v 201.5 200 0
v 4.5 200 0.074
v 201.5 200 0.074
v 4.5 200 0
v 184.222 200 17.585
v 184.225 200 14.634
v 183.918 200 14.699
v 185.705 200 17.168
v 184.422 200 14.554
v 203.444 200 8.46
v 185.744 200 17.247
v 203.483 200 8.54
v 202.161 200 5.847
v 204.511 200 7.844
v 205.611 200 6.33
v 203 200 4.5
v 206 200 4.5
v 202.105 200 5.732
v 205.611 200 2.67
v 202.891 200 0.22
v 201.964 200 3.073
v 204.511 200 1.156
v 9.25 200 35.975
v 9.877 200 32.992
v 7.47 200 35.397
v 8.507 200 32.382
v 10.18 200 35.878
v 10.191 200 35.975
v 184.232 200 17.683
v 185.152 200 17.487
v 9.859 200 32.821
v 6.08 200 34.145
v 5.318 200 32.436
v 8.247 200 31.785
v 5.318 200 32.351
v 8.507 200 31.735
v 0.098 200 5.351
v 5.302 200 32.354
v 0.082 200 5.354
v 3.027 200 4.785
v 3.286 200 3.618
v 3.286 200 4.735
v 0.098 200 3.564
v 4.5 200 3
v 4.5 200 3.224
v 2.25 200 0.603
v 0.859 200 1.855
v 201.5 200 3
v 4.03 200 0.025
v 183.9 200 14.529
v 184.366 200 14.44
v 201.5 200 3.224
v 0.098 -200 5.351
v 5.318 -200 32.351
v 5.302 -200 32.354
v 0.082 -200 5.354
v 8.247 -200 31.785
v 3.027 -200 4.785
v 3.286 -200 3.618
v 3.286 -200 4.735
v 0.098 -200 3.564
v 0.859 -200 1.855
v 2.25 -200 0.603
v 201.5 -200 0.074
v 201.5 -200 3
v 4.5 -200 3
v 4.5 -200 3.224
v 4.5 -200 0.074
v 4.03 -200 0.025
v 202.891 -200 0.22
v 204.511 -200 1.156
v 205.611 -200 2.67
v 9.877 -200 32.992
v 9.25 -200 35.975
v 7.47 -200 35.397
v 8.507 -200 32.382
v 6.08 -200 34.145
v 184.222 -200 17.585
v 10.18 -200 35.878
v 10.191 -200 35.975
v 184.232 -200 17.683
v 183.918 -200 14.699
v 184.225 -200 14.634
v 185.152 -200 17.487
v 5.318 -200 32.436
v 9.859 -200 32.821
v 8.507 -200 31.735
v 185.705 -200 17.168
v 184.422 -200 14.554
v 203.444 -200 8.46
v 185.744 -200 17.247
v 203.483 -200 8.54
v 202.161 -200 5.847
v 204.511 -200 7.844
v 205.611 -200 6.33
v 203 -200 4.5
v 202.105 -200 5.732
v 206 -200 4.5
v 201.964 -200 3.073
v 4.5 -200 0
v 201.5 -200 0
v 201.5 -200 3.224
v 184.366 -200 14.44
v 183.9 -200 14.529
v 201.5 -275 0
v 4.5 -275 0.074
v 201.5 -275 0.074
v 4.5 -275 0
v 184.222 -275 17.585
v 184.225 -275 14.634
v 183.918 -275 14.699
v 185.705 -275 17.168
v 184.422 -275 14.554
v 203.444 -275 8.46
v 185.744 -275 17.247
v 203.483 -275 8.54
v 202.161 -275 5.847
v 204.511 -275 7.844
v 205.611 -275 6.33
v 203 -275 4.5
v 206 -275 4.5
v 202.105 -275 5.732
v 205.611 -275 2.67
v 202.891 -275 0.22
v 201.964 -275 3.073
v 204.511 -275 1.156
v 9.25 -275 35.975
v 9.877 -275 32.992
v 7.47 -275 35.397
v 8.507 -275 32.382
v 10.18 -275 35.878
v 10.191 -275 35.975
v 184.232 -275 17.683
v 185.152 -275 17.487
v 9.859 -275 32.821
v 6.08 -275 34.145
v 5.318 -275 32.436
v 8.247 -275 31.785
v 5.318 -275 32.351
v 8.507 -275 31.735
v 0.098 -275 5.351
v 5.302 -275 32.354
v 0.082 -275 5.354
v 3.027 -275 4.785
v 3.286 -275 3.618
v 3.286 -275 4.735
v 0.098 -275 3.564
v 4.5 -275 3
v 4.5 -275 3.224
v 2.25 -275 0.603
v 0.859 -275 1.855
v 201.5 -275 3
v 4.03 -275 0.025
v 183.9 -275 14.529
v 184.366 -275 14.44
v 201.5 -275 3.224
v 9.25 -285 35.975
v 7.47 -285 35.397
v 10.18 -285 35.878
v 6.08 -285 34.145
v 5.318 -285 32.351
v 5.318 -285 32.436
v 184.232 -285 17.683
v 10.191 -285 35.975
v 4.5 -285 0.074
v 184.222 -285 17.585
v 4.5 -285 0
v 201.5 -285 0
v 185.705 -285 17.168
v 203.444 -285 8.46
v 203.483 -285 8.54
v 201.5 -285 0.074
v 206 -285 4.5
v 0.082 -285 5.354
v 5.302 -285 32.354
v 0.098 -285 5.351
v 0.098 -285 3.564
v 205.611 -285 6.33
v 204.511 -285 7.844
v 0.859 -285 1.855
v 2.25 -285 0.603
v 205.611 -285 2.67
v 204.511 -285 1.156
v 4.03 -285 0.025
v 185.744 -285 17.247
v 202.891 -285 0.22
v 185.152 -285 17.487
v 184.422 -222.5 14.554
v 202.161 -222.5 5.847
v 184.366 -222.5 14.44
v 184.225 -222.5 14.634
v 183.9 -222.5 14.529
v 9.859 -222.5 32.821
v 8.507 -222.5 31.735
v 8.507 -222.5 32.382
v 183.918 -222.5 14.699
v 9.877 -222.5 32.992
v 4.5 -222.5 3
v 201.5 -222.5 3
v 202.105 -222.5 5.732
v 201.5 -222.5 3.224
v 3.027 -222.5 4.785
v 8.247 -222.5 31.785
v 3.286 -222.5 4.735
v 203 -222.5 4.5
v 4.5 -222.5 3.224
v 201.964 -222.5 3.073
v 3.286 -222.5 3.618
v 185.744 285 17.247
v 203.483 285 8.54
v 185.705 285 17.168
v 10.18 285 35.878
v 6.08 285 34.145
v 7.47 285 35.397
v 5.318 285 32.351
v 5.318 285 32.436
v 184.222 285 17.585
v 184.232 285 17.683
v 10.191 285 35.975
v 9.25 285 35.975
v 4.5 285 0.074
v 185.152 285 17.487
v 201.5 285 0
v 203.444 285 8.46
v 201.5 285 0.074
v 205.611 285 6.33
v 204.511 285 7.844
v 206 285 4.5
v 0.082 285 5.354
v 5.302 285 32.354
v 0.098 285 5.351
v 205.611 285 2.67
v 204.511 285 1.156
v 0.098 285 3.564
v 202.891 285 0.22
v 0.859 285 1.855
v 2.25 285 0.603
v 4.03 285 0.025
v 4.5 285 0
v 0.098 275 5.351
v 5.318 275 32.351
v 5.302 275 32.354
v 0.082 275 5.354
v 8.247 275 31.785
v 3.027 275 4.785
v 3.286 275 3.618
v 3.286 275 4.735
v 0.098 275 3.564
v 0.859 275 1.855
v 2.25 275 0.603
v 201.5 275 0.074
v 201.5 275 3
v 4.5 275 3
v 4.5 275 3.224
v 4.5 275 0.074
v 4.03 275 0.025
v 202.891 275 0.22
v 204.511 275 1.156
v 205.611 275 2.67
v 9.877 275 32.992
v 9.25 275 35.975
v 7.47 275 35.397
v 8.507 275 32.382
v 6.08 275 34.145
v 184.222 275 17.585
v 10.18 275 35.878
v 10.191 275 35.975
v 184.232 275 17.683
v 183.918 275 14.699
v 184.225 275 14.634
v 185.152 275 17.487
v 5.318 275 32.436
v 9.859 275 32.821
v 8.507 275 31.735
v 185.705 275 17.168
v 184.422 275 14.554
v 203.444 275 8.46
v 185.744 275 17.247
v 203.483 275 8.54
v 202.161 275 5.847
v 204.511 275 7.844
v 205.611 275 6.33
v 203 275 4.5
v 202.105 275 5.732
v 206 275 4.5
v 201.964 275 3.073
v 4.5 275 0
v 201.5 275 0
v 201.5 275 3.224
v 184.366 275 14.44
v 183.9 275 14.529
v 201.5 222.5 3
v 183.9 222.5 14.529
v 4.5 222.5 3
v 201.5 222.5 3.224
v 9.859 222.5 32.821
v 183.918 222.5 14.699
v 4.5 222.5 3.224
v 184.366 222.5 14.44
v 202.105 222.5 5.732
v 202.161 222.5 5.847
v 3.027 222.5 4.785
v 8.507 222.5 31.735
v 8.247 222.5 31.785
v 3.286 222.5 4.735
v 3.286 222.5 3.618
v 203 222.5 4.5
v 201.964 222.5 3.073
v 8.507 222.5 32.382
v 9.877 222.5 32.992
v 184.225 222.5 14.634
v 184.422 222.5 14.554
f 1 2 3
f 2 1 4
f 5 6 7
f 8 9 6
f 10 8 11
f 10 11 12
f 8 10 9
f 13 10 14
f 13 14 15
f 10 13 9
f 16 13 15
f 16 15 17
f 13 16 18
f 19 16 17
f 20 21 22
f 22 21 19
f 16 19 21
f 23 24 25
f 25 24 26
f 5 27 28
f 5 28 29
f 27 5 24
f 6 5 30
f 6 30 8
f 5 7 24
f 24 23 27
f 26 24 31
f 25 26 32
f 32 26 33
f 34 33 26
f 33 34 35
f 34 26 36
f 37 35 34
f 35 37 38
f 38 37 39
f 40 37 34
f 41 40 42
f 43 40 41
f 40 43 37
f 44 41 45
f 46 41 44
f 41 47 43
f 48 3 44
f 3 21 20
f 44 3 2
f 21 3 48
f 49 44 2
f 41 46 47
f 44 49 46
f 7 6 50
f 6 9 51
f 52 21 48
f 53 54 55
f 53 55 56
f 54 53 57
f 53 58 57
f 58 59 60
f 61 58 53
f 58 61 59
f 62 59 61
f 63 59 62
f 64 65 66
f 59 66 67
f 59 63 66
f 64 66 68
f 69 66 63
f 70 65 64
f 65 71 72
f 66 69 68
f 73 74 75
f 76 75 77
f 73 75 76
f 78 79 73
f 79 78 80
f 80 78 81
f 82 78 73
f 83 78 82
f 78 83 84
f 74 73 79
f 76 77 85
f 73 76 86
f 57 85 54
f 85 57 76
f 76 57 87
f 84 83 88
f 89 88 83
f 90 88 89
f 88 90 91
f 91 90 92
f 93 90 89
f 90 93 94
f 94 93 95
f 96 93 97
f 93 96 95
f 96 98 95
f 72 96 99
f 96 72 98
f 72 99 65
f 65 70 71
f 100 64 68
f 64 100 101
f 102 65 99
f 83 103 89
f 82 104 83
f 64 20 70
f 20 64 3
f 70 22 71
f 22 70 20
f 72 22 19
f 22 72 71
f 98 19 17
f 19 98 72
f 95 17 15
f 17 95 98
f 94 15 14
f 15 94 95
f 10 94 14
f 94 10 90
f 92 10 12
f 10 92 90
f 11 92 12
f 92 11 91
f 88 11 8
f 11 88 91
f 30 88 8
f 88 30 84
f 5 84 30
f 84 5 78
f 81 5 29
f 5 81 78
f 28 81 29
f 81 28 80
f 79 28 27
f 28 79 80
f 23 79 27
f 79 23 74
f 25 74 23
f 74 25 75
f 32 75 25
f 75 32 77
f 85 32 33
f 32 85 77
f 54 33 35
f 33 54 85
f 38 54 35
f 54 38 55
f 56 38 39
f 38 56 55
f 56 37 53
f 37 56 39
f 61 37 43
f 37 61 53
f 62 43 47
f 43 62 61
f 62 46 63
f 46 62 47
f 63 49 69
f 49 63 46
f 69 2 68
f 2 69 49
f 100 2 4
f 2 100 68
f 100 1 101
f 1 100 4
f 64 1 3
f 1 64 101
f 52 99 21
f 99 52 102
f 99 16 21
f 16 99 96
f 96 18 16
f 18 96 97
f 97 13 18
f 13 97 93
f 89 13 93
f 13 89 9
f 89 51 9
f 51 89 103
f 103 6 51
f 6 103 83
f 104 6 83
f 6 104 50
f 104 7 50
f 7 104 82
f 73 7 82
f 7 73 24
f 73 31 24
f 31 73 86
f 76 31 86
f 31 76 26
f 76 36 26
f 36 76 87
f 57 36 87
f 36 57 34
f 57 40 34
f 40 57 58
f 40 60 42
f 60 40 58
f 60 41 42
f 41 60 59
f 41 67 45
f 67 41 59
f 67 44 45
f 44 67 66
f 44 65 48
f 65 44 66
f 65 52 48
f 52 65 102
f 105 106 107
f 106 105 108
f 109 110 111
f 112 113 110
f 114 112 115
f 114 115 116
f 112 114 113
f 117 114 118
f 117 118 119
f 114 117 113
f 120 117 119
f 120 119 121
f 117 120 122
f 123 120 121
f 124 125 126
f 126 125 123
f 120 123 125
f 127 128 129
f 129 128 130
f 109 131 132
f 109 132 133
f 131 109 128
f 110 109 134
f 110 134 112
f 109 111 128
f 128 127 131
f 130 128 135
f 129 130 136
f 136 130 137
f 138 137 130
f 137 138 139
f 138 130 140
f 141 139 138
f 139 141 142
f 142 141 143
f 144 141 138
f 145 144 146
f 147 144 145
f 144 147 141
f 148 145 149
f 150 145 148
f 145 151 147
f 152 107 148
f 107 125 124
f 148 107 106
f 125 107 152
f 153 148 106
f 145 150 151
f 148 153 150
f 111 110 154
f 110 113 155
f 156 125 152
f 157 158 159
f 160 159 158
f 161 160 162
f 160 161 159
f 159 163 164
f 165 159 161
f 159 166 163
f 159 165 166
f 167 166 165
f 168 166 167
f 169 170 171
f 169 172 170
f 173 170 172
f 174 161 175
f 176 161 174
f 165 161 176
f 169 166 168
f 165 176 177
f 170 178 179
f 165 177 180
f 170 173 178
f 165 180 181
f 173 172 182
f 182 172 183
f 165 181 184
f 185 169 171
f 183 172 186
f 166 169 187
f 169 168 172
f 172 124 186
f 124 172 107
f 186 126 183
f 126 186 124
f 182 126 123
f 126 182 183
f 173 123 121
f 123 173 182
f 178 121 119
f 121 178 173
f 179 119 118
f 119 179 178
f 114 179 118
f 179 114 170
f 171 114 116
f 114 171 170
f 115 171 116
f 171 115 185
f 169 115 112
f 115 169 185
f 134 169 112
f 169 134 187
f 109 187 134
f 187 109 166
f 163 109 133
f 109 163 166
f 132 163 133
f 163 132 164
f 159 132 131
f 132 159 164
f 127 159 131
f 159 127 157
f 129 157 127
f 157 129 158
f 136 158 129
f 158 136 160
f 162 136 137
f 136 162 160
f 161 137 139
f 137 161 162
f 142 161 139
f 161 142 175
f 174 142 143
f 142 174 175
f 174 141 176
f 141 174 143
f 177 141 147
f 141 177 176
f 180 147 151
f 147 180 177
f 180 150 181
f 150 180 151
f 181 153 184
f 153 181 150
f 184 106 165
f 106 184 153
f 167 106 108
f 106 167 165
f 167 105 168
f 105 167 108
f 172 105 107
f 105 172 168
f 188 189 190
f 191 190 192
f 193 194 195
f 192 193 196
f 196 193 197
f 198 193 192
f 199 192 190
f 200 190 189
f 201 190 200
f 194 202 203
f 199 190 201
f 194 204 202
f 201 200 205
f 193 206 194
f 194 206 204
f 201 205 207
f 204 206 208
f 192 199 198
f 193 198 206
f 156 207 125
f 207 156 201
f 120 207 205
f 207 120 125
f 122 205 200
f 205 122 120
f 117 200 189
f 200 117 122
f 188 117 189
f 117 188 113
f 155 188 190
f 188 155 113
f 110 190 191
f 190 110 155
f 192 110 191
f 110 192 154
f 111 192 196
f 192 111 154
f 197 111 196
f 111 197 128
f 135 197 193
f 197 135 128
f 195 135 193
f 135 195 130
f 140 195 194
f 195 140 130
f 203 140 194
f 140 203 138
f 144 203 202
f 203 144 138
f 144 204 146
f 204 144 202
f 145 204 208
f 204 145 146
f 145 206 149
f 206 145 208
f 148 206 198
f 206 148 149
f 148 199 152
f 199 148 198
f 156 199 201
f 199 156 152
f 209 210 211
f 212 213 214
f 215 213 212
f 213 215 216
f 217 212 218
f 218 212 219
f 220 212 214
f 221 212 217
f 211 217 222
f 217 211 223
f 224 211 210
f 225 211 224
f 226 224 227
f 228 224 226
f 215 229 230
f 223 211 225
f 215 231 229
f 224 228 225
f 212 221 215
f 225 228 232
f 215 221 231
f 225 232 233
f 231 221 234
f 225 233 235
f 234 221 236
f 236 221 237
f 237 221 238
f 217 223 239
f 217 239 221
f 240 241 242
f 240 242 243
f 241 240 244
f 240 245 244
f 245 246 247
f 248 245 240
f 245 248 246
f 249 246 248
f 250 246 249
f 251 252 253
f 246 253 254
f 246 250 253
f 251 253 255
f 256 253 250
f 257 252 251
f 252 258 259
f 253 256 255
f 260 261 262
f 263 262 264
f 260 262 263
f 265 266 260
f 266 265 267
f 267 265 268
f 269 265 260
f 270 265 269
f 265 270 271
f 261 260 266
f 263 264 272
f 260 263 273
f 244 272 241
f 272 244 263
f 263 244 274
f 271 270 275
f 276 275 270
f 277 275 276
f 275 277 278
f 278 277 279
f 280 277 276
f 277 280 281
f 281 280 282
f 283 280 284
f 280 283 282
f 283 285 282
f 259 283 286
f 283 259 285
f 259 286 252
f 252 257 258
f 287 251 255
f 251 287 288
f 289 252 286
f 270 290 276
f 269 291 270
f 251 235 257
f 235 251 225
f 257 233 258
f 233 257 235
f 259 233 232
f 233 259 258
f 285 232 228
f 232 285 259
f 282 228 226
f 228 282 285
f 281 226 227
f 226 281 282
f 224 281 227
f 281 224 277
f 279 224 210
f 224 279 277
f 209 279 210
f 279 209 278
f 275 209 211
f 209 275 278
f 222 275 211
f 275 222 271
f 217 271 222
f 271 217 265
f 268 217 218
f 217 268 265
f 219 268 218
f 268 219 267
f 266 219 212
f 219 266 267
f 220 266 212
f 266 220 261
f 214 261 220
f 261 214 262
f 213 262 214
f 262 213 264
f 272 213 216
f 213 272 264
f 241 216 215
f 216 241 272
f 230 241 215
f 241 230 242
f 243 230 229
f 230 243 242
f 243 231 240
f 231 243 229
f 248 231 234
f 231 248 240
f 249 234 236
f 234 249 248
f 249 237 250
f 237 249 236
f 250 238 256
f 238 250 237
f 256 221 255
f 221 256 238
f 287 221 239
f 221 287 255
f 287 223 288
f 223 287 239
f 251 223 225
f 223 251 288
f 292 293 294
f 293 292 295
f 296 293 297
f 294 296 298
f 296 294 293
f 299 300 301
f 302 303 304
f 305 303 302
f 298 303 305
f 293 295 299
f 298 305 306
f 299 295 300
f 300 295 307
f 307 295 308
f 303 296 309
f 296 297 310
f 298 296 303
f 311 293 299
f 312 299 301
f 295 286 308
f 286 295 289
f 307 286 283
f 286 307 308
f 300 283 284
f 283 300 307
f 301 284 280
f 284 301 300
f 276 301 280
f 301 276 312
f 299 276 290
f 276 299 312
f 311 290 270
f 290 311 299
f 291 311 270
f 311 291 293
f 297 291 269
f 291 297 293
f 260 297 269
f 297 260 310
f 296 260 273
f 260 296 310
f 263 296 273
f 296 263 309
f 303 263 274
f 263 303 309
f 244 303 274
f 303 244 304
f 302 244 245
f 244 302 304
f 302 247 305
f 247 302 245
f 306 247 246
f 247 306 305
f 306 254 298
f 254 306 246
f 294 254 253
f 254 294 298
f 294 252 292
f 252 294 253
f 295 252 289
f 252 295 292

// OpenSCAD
// file: fjkb_profile.scad
module bar(s,t,r,p) {
  translate(p) {
    rotate(r) {
      translate(t) {
        square(size=s,center=true);
}}}}

/************************/
/*
t=165;
f=27.5;
w=200;
h=30;
ang=6;
ri=1.5;
*/

module lid(s,e,b,l,t,f,w,h,ang,ri) {
  union() {
    translate([0,0,s*(l+b)/2]) {
      linear_extrude(height=b,center=true) {
        ocontour(e,t,f,w,h,ang,ri);
      }
    }

    linear_extrude(height=b/2+l,center=true) {
      translate([e,e,0]){
        icontour(t,f,w,h,ang,ri);  
      }
    }
  }
}

module profile(e,l,t,f,w,h,ang,ri) {
  difference() {
    linear_extrude(height=l,center=true) {
      ocontour(e,t,f,w,h,ang,ri);
    }

    linear_extrude(height=l+10,center=true) {
      translate([e,e,0]){
        icontour(t,f,w,h,ang,ri);  
      }
    }
  }
}

module ocontour(e,t,f,w,h,ang,ri) {
  icontour(t,f,w+2*e,h+2*e,ang,ri+e);
}

module icontour(t,f,w,h,ang,ri) {

aux_f=acos((h-2*ri)/f);

A=[0,0];
B=[f*sin(aux_f),h-2*ri];
C=[B[0]+t*cos(ang),B[1]-t*sin(ang)];
D=[w-2*ri,0];

P=[A,B,C,D];

aux_r=atan((D[1]-C[1])/(D[0]-C[0]));
r = (D[1]-C[1])/sin(aux_r); //sqrt(pow(a,2)+pow(b,2))

/************************/

translate([ri,ri,0]) {

polygon(P);

for(k=[0:3]) {
  translate([P[k][0],P[k][1],0]) {
    circle(r=ri,center=true);
  } 
}

bar([2*ri,f],[0,f/2,0],[0,0,-aux_f],[0,0,0]);
bar([t,2*ri],[t/2,0,0],[0,0,-ang],[B[0],h-2*ri,0]);
bar([r,2*ri],[r/2,0,0],[0,0,aux_r],[C[0],C[1],0]);
bar([w-2*ri,2*ri],[w/2-ri,0,0],[0,0,0],[0,0,0]);

}

/************************/

a_bf=90-aux_f;
a_tf=90-ang+aux_f;
a_tr=180+aux_r-ang;
a_br=90+aux_r;

echo("a_bf:", a_bf);
echo("a_tf:", a_tf);
echo("a_tr:", a_tr);
echo("a_br:", a_br);

echo("l_r:", r);

}
// main file
include <fjkb_profile.scad>

// K: keyboard
// L: lid

b_l=400; //K: Width
b_d=200; //K: Depth
b_h=30;  //K: Height
b_ang=6; //K: ANGle

l_b=10; //L: Border
l_d=50; //L: Depth

b_f=27.5; //Front height
b_e=3;    //Thickness
b_t=175;  //Top depth
b_r=1.5;  //Blending radius

rotate([90,0,0]) {

profile(b_e,b_l,b_t,b_f,b_d,b_h,b_ang,b_r);

translate([0,0,250]) {
  lid(1,b_e,l_b,l_d,b_t,b_f,b_d,b_h,b_ang,b_r);   
}

translate([0,0,-250]) {
  lid(-1,b_e,l_b,l_d,b_t,b_f,b_d,b_h,b_ang,b_r);   
}

}
